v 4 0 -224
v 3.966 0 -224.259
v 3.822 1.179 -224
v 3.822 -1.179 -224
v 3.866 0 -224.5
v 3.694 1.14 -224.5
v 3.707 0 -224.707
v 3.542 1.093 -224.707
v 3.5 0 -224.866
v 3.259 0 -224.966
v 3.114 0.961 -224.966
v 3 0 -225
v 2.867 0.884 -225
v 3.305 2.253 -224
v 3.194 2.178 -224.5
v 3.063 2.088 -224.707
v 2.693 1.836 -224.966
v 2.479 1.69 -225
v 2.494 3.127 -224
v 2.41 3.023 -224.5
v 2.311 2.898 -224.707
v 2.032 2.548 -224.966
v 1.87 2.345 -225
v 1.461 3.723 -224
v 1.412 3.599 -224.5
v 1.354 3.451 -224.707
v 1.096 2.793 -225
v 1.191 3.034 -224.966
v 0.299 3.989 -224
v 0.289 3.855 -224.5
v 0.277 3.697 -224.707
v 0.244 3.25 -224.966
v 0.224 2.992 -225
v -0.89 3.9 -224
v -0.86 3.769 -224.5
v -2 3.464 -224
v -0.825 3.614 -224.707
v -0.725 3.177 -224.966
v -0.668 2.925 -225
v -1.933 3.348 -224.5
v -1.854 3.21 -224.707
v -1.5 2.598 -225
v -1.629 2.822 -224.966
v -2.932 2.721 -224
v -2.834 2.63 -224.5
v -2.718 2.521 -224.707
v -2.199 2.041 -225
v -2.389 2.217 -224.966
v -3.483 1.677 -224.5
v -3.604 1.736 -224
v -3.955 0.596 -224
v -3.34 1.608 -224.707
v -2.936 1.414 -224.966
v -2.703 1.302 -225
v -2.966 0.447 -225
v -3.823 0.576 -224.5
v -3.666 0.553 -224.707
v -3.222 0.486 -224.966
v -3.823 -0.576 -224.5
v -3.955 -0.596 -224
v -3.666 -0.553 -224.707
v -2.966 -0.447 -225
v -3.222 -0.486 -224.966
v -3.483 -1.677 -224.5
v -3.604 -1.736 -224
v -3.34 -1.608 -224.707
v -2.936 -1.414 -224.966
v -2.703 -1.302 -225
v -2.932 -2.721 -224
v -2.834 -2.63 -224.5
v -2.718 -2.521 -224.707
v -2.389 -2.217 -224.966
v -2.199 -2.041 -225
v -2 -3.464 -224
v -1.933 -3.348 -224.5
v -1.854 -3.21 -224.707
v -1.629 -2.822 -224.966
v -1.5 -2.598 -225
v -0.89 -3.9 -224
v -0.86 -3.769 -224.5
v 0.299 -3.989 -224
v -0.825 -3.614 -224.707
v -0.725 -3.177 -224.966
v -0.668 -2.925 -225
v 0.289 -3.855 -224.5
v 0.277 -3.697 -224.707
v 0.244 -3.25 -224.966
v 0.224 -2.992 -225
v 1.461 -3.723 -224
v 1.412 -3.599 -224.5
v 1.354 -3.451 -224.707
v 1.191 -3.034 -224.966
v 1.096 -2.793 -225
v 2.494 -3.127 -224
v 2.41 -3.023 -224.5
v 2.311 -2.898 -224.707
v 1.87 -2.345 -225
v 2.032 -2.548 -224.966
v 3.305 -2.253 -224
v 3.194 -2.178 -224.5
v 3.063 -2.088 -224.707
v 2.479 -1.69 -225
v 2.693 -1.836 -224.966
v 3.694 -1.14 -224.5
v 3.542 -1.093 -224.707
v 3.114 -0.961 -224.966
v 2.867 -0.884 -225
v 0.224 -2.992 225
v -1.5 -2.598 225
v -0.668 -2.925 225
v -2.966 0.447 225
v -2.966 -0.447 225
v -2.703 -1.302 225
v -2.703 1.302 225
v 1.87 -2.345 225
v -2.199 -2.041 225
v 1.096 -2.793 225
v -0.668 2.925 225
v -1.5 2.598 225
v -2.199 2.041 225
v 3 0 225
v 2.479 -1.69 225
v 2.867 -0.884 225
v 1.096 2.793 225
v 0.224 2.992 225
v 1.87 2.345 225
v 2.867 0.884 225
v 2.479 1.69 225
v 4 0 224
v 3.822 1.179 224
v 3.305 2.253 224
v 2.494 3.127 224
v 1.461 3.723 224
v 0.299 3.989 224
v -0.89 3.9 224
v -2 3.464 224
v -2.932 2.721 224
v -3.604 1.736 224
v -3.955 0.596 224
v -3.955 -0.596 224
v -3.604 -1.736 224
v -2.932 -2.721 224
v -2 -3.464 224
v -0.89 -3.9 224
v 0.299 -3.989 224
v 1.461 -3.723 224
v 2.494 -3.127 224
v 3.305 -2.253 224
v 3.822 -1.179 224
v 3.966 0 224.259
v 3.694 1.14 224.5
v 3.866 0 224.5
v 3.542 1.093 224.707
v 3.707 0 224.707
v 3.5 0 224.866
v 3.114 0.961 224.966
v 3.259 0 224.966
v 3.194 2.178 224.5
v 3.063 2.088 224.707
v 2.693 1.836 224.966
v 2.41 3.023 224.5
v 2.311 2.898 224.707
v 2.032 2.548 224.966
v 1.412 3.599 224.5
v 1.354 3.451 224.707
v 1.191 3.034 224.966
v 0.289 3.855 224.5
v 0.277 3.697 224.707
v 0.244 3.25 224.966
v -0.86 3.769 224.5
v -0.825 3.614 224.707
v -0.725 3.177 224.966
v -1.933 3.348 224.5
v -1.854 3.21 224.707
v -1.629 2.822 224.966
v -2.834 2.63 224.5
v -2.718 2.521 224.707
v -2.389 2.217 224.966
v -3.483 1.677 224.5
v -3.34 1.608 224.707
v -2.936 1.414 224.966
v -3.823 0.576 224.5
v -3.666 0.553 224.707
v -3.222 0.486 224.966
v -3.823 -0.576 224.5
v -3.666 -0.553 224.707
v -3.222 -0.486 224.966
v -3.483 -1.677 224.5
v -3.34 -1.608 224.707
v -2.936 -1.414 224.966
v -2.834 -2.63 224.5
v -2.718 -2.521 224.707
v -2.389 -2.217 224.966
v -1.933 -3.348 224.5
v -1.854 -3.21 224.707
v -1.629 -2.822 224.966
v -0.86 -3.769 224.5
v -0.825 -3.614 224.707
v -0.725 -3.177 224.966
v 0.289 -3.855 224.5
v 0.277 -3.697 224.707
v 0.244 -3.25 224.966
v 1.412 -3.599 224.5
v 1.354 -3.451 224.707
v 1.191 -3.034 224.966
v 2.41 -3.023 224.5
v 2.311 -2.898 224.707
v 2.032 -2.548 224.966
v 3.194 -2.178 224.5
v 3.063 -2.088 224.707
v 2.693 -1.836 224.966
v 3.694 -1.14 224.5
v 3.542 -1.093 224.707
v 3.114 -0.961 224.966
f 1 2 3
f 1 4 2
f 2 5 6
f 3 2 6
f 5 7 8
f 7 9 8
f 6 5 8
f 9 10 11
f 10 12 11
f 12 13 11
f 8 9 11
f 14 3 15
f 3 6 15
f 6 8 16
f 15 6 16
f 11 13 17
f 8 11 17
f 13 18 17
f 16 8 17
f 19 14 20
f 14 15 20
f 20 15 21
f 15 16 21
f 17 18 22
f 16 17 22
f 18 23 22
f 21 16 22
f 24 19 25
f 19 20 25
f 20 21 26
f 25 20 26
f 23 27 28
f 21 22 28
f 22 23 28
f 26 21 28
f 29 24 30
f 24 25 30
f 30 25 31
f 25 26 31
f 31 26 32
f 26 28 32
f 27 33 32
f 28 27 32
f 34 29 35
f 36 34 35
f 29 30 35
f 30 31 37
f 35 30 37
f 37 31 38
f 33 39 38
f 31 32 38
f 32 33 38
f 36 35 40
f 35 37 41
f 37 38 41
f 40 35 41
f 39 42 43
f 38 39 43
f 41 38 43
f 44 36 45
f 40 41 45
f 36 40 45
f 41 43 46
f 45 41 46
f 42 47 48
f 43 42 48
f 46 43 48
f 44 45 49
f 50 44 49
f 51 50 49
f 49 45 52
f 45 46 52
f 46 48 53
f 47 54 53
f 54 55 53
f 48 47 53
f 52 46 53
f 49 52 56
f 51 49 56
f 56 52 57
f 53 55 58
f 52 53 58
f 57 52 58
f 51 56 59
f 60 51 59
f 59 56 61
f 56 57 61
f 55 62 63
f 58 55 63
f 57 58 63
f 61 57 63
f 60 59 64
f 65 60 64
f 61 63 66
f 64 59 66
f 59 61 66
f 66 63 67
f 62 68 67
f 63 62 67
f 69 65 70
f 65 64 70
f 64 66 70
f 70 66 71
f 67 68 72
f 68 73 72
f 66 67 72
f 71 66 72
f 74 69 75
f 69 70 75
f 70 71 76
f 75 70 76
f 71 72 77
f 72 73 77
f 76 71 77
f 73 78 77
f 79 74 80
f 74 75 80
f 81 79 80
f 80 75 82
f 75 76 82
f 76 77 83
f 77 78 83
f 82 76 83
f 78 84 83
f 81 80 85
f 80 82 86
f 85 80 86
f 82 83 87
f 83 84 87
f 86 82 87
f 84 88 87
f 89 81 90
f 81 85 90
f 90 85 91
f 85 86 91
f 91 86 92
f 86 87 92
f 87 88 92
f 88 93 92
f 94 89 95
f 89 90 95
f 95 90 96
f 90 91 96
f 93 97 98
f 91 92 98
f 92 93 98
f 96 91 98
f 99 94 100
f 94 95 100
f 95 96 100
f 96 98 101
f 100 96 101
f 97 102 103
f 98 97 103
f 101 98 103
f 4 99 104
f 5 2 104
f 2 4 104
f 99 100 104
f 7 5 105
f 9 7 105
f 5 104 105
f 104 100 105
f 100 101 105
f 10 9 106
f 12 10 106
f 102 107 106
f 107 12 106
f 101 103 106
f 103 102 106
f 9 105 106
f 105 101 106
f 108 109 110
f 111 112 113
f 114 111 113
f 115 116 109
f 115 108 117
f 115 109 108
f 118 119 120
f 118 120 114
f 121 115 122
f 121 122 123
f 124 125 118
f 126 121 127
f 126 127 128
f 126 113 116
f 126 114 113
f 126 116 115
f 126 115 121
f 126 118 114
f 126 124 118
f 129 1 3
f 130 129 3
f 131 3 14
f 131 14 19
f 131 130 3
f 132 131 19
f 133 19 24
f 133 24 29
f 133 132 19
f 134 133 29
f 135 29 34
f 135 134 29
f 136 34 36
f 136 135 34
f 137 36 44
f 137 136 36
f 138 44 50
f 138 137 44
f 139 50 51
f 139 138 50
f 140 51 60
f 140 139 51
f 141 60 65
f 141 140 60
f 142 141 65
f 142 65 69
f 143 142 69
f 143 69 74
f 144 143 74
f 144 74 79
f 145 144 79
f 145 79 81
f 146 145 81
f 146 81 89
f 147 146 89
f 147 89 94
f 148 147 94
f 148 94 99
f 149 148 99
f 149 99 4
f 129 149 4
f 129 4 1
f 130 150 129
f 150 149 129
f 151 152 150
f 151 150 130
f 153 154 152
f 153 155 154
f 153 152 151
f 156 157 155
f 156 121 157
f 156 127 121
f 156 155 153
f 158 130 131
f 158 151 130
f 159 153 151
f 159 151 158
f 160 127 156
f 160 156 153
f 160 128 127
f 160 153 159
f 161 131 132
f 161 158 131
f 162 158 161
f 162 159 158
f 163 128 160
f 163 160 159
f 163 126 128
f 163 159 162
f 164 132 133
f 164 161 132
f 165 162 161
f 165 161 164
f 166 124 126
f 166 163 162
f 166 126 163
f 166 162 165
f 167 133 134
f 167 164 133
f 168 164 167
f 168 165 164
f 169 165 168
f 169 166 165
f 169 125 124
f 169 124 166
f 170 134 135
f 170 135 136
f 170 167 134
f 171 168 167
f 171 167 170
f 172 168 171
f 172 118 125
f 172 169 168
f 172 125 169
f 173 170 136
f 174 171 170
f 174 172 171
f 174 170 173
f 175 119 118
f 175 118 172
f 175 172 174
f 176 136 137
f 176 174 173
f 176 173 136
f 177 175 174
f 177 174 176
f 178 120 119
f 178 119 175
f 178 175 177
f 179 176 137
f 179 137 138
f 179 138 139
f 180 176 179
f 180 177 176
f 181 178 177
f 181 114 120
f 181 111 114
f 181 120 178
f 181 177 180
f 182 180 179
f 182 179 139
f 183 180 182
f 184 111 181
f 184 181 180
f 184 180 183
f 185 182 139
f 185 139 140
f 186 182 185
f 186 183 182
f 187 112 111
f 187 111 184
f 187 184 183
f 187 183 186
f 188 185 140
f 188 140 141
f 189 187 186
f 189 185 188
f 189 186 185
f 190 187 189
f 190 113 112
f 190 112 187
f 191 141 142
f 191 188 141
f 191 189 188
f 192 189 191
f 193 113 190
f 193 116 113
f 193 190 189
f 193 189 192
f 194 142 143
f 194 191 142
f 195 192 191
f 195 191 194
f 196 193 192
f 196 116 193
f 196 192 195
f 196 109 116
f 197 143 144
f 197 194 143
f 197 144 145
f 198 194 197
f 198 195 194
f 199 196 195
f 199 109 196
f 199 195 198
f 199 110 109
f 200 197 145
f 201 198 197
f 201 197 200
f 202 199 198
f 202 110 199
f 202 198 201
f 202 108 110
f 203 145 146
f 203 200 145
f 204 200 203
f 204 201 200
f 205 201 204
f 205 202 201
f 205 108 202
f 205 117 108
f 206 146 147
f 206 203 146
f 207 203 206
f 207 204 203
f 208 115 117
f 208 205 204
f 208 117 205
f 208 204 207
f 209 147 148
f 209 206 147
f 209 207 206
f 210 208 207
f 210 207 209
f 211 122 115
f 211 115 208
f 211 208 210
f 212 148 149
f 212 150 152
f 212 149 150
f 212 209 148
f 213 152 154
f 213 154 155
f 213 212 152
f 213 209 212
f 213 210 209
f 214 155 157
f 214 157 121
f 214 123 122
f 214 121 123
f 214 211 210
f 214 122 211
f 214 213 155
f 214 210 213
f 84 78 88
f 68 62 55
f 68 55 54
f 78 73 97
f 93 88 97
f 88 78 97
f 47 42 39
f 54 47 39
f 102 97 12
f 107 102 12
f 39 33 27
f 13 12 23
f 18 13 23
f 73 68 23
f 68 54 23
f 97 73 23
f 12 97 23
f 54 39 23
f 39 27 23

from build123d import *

# Parameters (mm, degrees)
EXTRUDE2_DEPTH      = 225
EXTRUDE2_DEPTH_BACK = 225
SKETCH1_R           = 4
FILLET2_R           = 1
FILLET3_R           = 1


with BuildPart() as part:
    # Sketch1 → Extrude2 (new, two sides: drawn at the far end of the back side and taken through both)
    with BuildSketch(Plane.XY.offset(-EXTRUDE2_DEPTH_BACK)):
        Circle(SKETCH1_R)
    extrude(amount=EXTRUDE2_DEPTH + EXTRUDE2_DEPTH_BACK)

    # Fillet2
    fillet2_edges = [part.edges().sort_by_distance(p)[0] for p in [
        (-4, 0, -225),
    ]]
    fillet(fillet2_edges, radius=FILLET2_R)

    # Fillet3
    fillet3_edges = [part.edges().sort_by_distance(p)[0] for p in [
        (-4, 0, 225),
    ]]
    fillet(fillet3_edges, radius=FILLET3_R)


solid = part.part
